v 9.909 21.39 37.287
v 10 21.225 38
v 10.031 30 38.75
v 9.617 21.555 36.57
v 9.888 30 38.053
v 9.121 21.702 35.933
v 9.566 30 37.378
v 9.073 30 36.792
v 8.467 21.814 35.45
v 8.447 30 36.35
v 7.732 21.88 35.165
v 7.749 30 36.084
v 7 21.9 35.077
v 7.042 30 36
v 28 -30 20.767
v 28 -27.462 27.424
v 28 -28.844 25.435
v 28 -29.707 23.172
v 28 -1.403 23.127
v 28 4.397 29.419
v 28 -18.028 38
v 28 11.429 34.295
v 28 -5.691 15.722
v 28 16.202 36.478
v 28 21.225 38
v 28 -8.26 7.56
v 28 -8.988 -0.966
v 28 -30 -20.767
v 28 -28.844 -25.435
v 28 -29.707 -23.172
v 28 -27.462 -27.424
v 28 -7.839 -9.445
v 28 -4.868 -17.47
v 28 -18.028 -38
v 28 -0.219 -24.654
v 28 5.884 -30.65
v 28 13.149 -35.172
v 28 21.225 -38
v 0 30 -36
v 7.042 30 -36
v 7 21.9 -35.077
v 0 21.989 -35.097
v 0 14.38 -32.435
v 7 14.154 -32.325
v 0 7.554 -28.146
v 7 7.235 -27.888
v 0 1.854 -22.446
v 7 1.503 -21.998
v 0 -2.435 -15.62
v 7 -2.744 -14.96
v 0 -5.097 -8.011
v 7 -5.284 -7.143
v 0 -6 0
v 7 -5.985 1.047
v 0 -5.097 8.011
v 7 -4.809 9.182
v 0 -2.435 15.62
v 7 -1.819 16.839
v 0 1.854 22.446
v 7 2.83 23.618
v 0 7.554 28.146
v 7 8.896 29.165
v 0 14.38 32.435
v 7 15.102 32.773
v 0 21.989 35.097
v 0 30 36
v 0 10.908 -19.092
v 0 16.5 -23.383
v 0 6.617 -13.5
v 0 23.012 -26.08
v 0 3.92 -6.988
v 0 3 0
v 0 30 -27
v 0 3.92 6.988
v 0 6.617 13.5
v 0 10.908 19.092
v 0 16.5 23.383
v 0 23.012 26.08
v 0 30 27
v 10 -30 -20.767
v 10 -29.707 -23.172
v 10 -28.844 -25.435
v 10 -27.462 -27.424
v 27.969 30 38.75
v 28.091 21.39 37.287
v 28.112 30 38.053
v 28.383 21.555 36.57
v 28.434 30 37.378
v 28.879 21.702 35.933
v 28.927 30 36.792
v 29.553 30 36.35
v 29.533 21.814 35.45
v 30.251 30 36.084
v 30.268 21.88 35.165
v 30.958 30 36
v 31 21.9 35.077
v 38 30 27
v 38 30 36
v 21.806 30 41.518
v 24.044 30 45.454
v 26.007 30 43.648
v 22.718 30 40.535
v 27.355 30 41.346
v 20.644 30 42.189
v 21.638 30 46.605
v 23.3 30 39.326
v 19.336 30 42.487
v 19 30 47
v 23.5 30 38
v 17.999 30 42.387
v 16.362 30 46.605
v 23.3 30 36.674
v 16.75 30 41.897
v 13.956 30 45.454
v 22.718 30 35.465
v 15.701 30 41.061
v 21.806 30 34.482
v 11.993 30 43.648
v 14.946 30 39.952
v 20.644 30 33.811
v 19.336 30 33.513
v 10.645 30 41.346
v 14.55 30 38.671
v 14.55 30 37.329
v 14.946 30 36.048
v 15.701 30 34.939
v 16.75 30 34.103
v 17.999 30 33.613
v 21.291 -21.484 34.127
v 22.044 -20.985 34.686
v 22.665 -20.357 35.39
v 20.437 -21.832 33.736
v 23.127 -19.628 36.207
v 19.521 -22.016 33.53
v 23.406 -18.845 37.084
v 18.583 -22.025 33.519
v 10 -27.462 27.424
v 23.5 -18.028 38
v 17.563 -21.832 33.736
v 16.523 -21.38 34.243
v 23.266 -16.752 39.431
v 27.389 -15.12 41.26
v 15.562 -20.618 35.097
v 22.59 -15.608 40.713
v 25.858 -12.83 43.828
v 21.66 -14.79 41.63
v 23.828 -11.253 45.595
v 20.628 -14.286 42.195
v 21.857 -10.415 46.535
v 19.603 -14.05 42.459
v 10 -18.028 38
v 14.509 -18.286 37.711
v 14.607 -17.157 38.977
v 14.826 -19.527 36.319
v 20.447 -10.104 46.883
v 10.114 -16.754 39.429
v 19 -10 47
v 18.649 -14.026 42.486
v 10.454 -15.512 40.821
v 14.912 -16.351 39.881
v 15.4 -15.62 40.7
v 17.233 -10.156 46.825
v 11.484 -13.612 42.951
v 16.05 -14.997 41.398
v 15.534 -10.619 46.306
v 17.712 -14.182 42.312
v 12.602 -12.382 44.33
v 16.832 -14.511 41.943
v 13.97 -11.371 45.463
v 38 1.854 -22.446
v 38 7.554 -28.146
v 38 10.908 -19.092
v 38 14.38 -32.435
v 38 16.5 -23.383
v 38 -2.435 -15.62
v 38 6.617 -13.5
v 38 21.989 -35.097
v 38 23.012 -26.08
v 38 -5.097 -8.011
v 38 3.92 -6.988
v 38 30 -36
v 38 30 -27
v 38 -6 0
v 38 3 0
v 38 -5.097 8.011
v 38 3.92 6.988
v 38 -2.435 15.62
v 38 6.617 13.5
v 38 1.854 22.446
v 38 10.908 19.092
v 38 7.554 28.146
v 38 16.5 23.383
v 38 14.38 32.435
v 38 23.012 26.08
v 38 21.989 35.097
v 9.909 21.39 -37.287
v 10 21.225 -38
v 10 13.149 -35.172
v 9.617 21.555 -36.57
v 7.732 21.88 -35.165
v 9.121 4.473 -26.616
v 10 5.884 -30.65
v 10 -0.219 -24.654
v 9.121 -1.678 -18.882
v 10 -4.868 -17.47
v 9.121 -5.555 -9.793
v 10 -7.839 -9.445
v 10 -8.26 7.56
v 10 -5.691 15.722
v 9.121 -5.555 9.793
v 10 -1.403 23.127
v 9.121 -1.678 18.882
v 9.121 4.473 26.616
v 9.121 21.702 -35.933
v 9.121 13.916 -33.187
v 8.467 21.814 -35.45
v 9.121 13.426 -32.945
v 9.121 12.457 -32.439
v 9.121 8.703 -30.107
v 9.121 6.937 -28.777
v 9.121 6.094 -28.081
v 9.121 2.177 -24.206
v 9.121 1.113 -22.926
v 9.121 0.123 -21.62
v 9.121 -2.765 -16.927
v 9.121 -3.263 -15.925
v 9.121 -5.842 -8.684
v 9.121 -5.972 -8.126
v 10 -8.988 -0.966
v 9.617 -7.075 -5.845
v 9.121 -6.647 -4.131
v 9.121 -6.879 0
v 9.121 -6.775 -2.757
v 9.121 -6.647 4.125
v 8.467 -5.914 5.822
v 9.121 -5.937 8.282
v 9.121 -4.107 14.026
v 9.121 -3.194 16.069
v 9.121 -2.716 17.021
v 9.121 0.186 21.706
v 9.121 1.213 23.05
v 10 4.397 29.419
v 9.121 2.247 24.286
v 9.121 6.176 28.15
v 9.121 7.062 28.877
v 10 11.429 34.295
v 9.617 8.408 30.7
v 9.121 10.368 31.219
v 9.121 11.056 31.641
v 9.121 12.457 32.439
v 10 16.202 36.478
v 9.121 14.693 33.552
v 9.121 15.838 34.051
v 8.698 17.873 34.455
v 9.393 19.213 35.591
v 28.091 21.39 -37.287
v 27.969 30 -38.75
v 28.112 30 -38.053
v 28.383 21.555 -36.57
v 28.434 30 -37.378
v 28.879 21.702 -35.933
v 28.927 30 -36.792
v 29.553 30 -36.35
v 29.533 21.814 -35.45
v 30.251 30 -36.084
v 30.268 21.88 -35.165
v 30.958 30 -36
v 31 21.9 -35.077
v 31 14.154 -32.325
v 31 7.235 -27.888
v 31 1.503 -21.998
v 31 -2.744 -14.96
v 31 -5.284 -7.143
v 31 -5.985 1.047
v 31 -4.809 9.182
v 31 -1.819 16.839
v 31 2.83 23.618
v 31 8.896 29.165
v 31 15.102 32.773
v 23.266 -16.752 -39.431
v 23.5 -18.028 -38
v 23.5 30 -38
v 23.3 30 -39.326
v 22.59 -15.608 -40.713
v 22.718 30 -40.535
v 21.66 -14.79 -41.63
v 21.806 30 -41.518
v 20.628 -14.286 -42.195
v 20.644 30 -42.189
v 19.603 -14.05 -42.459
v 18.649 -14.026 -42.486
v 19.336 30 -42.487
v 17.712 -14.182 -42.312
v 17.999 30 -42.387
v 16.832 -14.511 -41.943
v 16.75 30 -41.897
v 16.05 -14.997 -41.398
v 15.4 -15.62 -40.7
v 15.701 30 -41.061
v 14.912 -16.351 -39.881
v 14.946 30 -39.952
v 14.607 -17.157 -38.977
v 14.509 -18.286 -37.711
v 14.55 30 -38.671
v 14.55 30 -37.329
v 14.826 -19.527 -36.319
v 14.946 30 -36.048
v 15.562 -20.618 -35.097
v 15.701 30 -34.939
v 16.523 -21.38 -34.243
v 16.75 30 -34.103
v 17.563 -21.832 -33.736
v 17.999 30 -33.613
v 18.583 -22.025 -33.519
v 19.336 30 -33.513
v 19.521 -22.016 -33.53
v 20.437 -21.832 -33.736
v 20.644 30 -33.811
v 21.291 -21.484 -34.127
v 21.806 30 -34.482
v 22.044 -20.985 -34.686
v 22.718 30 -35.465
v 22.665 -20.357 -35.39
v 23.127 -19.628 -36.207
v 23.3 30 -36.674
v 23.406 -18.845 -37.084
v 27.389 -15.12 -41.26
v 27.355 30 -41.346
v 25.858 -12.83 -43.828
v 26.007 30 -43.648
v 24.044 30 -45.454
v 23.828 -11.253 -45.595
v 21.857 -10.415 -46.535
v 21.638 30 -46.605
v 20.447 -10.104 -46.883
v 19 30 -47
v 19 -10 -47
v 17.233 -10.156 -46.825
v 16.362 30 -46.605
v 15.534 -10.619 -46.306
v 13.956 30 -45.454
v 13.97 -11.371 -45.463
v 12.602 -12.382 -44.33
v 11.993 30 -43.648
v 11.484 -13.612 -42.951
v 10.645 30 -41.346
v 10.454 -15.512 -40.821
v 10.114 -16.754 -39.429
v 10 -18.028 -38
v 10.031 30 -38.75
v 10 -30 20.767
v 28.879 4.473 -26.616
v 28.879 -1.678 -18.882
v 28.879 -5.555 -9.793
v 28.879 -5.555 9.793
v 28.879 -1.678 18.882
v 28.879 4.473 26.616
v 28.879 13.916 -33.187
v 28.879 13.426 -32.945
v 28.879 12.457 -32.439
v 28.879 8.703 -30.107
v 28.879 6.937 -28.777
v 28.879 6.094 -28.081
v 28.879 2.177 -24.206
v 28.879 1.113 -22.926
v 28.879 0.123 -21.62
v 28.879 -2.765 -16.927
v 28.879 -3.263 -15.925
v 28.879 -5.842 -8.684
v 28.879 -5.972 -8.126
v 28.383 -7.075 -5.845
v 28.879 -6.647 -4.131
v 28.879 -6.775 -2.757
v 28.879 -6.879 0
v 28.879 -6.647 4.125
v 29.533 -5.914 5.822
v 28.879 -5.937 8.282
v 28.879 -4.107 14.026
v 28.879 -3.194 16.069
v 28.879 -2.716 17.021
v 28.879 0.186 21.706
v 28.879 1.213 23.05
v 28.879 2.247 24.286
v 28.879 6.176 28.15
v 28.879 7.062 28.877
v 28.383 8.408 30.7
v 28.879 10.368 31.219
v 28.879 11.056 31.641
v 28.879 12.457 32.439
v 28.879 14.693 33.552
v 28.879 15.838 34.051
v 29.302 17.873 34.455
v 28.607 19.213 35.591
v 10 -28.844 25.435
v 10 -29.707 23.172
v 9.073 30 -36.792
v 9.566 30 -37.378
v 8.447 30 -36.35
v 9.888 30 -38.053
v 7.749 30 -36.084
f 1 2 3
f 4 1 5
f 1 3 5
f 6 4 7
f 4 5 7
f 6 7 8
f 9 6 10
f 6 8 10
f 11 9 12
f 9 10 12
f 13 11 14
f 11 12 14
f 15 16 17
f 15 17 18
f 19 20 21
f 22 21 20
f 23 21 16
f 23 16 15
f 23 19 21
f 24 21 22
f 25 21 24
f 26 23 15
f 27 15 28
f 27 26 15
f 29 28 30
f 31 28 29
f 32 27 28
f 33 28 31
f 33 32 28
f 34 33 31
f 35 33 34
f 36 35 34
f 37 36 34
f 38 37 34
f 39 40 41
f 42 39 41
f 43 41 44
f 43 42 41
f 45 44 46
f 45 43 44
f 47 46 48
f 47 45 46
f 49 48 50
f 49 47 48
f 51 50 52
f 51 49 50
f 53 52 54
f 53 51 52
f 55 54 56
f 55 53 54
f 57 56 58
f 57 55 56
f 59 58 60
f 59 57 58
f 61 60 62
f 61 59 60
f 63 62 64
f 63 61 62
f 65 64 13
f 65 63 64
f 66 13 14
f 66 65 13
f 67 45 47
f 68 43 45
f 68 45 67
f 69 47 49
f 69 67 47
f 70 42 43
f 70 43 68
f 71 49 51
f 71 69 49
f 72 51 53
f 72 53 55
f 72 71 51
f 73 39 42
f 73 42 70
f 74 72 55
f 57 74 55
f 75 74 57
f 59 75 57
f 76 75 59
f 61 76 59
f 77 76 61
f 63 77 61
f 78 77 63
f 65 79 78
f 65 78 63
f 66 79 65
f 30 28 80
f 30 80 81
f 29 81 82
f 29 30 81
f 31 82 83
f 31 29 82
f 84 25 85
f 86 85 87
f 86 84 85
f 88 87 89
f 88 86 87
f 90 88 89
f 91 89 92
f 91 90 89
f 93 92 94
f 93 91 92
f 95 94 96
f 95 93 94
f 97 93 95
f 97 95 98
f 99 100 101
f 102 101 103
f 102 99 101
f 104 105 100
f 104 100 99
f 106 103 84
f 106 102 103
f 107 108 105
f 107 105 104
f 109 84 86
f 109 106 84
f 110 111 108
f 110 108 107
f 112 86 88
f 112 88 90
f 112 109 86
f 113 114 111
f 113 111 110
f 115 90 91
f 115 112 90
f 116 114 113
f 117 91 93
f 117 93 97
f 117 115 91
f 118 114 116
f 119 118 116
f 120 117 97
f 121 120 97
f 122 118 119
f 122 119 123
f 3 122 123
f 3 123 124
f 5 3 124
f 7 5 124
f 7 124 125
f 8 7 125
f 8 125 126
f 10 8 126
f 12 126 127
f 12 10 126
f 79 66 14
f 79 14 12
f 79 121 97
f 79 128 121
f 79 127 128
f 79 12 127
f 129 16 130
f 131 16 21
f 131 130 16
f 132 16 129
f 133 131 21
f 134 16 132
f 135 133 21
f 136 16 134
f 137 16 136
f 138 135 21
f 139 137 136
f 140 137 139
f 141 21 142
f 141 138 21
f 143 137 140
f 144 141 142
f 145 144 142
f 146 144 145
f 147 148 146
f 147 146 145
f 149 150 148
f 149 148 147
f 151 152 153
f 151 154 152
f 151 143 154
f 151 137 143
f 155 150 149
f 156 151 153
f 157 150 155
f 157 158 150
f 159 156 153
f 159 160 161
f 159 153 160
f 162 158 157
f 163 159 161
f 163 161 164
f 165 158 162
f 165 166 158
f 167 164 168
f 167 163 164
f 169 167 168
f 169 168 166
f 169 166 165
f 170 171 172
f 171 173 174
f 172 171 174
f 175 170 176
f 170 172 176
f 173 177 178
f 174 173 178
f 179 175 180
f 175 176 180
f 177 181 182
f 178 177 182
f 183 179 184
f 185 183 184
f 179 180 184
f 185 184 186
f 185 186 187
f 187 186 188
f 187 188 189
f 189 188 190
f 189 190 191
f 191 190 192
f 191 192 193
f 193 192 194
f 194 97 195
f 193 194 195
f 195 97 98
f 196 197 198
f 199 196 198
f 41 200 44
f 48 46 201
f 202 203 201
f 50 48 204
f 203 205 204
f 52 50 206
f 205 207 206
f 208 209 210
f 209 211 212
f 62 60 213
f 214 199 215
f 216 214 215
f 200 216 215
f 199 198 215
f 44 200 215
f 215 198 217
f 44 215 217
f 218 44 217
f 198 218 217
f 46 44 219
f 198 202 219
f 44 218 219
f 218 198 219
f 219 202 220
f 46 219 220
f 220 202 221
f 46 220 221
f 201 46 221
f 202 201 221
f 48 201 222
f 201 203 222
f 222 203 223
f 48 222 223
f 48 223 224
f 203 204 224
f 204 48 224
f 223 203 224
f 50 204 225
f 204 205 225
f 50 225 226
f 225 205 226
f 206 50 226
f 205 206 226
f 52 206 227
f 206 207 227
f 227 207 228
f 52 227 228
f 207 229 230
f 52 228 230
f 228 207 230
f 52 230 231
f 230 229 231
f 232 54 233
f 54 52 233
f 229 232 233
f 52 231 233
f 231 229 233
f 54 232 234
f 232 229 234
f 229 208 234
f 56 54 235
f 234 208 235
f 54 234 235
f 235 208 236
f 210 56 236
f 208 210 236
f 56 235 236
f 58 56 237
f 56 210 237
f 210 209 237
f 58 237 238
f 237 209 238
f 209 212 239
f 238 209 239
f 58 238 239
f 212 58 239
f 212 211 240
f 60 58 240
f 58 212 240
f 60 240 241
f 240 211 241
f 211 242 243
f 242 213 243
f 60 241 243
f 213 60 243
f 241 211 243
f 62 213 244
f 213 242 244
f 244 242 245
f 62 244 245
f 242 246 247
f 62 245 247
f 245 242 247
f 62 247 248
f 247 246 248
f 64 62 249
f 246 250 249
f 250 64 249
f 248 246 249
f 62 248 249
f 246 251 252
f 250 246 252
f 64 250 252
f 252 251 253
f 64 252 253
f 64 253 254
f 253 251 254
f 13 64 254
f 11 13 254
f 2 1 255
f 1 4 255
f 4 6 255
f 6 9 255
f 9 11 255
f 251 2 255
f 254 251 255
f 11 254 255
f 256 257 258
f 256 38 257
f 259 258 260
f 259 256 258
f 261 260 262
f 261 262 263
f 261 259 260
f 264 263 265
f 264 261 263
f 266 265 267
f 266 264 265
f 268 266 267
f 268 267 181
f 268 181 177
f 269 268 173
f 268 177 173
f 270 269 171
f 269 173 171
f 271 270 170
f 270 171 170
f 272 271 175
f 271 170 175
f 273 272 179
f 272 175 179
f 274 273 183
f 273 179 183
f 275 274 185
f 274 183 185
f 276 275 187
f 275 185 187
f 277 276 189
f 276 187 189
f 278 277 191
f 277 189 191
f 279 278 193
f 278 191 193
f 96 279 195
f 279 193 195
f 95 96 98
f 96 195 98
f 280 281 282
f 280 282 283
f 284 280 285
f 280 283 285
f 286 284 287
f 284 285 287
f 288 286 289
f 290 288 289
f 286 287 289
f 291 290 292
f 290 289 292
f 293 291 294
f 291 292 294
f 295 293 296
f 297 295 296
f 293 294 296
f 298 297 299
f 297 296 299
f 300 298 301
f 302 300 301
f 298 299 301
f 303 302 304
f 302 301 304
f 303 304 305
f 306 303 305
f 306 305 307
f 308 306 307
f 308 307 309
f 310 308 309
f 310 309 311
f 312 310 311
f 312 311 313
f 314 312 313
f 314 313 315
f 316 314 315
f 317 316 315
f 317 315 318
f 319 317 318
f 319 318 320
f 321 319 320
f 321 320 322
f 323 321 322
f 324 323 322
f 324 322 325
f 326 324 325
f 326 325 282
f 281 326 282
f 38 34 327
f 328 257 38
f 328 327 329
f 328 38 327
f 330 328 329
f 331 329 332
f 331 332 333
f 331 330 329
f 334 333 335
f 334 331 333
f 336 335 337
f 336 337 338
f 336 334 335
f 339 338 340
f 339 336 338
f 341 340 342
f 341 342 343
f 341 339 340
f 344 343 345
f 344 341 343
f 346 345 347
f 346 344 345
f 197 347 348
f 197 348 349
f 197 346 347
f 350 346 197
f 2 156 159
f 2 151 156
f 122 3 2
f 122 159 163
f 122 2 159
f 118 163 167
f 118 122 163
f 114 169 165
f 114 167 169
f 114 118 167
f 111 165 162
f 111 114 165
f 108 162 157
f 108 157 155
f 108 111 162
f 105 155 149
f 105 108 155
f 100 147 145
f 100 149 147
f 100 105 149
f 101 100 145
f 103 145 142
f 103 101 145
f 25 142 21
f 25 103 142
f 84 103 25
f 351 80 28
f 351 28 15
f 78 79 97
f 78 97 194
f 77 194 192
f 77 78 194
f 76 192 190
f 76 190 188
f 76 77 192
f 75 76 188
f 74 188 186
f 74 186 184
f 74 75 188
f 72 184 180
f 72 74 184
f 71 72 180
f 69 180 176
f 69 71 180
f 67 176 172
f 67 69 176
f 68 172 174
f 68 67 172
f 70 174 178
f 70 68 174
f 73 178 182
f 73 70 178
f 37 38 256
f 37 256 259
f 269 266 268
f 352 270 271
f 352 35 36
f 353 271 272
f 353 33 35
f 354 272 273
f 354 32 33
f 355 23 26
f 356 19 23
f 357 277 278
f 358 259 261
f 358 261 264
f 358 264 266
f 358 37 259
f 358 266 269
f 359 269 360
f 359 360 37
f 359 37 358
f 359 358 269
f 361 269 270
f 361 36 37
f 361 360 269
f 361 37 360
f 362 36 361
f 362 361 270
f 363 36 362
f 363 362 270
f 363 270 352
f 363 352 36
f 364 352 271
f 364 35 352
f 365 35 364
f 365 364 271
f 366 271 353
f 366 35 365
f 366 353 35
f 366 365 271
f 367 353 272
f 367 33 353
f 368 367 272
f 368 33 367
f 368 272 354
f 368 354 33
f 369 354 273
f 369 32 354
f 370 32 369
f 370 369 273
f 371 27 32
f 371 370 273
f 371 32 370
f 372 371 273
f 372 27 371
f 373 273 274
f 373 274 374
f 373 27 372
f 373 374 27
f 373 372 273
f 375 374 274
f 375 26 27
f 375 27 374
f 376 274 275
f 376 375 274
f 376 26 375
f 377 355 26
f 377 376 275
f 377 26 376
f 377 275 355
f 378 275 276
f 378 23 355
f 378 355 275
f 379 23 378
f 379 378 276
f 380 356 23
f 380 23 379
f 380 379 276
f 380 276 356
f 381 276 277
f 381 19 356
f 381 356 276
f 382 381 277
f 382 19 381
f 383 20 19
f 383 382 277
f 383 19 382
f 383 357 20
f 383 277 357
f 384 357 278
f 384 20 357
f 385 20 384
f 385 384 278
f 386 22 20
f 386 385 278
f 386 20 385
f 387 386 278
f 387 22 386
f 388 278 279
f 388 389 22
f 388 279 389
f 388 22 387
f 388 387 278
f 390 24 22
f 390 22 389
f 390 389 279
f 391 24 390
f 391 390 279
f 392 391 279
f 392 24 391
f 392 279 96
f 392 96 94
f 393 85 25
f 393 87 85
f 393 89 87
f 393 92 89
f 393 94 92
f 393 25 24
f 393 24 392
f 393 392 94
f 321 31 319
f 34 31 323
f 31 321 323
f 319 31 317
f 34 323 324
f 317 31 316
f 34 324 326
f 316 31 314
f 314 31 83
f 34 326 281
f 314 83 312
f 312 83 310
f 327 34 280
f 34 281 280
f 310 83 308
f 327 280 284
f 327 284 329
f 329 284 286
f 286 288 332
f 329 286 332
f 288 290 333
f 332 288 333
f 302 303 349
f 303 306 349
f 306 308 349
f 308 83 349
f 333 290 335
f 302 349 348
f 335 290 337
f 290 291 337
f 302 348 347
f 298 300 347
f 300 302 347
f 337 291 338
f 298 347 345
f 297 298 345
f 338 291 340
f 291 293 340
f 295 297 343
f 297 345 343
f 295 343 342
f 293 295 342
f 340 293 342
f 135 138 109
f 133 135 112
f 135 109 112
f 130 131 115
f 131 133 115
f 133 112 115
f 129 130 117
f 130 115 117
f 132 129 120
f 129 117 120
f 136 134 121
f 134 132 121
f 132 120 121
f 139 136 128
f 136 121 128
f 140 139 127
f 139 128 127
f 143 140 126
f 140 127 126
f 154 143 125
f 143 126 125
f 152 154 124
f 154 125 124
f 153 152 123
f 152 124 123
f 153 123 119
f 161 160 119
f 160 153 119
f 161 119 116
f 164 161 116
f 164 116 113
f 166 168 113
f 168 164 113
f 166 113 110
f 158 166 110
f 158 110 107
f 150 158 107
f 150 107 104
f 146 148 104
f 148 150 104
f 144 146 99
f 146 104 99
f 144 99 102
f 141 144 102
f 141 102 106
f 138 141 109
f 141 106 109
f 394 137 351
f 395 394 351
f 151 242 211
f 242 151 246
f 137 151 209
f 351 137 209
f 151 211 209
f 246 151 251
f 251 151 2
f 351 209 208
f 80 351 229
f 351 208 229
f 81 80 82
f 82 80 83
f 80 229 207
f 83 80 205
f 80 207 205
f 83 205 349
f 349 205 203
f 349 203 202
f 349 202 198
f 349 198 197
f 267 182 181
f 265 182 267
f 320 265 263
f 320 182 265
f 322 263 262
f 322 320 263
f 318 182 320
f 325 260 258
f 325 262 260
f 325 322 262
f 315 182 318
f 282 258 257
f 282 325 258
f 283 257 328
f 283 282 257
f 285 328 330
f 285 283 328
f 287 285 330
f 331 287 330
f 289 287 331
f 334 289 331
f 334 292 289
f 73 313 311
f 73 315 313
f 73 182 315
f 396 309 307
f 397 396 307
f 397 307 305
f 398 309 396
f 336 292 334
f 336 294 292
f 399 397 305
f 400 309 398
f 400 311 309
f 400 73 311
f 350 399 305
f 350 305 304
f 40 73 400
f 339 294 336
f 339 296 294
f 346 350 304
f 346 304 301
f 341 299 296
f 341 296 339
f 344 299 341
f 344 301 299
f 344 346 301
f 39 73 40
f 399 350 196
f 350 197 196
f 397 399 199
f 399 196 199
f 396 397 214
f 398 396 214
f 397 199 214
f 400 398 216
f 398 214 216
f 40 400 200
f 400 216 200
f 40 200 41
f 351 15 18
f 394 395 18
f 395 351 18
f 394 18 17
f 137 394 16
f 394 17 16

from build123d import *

# Parameters (mm, degrees)
BOSS_EXTRUDE1_DEPTH = 38
SKETCH2_R           = 9
SKETCH2_R_2         = 4.5
BOSS_EXTRUDE3_DEPTH = 60
SKETCH4_R           = 4.5
CUT_EXTRUDE1_DEPTH  = 61
CUT_EXTRUDE4_DEPTH  = 39
FILLET1_R           = 10
CUT_EXTRUDE5_DEPTH  = 10
SKETCH7_OUTSIDE_W   = 119.562
SKETCH7_OUTSIDE_H   = 85.562
SKETCH7_OUTSIDE_R   = 36
CUT_EXTRUDE6_DEPTH  = 10
FILLET2_R           = 3


with BuildPart() as part:
    # Sketch1 → Boss-Extrude1 (new body)
    with BuildSketch(Plane(origin=(0, 0, 0), x_dir=(0, 0, -1), z_dir=(1, 0, 0))):
        with BuildLine():
            Line((27, 30), (38, 30))
            Line((38, 30), (38, -30))
            Line((38, -30), (-38, -30))
            Line((-38, -30), (-38, 30))
            Line((-38, 30), (-27, 30))
            ThreePointArc((-27, 30), (0, 3), (27, 30))
        make_face()
    extrude(amount=BOSS_EXTRUDE1_DEPTH)

    # Sketch2 → Boss-Extrude3 (add, through all)
    with BuildSketch(Plane(origin=(0, 30, 0), x_dir=(1, 0, 0), z_dir=(0, 1, 0))):
        with Locations((19, -38)):
            Circle(SKETCH2_R)
        with Locations((19, -38)):
            Circle(SKETCH2_R_2, mode=Mode.SUBTRACT)
        with Locations((19, 38)):
            Circle(SKETCH2_R)
        with Locations((19, 38)):
            Circle(SKETCH2_R_2, mode=Mode.SUBTRACT)
    extrude(amount=-BOSS_EXTRUDE3_DEPTH)

    # Sketch4 → Cut-Extrude1 (cut, through all)
    with BuildSketch(Plane(origin=(0, 30, 0), x_dir=(1, 0, 0), z_dir=(0, 1, 0))):
        with Locations((19, -38)):
            Circle(SKETCH4_R)
        with Locations((19, 38)):
            Circle(SKETCH4_R)
    extrude(amount=-CUT_EXTRUDE1_DEPTH, mode=Mode.SUBTRACT)

    # Sketch5 → Cut-Extrude4 (cut, through all)
    with BuildSketch(Plane.ZY):
        Polygon((-47, -30), (-24.579488272, -30), (-47, -10), align=None)
        Polygon((47, -30), (24.579488272, -30), (47, -10), align=None)
    extrude(amount=-CUT_EXTRUDE4_DEPTH, mode=Mode.SUBTRACT)

    # Fillet1
    fillet1_edges = [part.edges().sort_by_distance(p)[0] for p in [
        (19, -30, 24.579488272),
        (19, -30, -24.579488272),
    ]]
    fillet(fillet1_edges, radius=FILLET1_R)

    # Sketch1<3> → Cut-Extrude5 (cut)
    with BuildSketch(Plane(origin=(0, 0, 0), x_dir=(0, 0, -1), z_dir=(1, 0, 0))):
        with BuildLine():
            Line((38, 30), (36, 30))
            ThreePointArc((36, 30), (0, -6), (-36, 30))
            Line((-36, 30), (-38, 30))
            Line((-38, 30), (-38, -30))
            Line((-38, -30), (38, -30))
            Line((38, -30), (38, 30))
        make_face()
    extrude(amount=CUT_EXTRUDE5_DEPTH, mode=Mode.SUBTRACT)

    # Sketch7 outside → Cut-Extrude6 (cut)
    with BuildSketch(Plane(origin=(38, 0, 0), x_dir=(0, 0, -1), z_dir=(1, 0, 0))):
        Rectangle(SKETCH7_OUTSIDE_W, SKETCH7_OUTSIDE_H)
        with Locations((0, 30)):
            Circle(SKETCH7_OUTSIDE_R, mode=Mode.SUBTRACT)
    extrude(amount=-CUT_EXTRUDE6_DEPTH, mode=Mode.SUBTRACT)

    # Fillet2
    fillet2_edges = [part.edges().sort_by_distance(p)[0] for p in [
        (10, -6, 0),
        (28, -6, 0),
    ]]
    fillet(fillet2_edges, radius=FILLET2_R)


solid = part.part
